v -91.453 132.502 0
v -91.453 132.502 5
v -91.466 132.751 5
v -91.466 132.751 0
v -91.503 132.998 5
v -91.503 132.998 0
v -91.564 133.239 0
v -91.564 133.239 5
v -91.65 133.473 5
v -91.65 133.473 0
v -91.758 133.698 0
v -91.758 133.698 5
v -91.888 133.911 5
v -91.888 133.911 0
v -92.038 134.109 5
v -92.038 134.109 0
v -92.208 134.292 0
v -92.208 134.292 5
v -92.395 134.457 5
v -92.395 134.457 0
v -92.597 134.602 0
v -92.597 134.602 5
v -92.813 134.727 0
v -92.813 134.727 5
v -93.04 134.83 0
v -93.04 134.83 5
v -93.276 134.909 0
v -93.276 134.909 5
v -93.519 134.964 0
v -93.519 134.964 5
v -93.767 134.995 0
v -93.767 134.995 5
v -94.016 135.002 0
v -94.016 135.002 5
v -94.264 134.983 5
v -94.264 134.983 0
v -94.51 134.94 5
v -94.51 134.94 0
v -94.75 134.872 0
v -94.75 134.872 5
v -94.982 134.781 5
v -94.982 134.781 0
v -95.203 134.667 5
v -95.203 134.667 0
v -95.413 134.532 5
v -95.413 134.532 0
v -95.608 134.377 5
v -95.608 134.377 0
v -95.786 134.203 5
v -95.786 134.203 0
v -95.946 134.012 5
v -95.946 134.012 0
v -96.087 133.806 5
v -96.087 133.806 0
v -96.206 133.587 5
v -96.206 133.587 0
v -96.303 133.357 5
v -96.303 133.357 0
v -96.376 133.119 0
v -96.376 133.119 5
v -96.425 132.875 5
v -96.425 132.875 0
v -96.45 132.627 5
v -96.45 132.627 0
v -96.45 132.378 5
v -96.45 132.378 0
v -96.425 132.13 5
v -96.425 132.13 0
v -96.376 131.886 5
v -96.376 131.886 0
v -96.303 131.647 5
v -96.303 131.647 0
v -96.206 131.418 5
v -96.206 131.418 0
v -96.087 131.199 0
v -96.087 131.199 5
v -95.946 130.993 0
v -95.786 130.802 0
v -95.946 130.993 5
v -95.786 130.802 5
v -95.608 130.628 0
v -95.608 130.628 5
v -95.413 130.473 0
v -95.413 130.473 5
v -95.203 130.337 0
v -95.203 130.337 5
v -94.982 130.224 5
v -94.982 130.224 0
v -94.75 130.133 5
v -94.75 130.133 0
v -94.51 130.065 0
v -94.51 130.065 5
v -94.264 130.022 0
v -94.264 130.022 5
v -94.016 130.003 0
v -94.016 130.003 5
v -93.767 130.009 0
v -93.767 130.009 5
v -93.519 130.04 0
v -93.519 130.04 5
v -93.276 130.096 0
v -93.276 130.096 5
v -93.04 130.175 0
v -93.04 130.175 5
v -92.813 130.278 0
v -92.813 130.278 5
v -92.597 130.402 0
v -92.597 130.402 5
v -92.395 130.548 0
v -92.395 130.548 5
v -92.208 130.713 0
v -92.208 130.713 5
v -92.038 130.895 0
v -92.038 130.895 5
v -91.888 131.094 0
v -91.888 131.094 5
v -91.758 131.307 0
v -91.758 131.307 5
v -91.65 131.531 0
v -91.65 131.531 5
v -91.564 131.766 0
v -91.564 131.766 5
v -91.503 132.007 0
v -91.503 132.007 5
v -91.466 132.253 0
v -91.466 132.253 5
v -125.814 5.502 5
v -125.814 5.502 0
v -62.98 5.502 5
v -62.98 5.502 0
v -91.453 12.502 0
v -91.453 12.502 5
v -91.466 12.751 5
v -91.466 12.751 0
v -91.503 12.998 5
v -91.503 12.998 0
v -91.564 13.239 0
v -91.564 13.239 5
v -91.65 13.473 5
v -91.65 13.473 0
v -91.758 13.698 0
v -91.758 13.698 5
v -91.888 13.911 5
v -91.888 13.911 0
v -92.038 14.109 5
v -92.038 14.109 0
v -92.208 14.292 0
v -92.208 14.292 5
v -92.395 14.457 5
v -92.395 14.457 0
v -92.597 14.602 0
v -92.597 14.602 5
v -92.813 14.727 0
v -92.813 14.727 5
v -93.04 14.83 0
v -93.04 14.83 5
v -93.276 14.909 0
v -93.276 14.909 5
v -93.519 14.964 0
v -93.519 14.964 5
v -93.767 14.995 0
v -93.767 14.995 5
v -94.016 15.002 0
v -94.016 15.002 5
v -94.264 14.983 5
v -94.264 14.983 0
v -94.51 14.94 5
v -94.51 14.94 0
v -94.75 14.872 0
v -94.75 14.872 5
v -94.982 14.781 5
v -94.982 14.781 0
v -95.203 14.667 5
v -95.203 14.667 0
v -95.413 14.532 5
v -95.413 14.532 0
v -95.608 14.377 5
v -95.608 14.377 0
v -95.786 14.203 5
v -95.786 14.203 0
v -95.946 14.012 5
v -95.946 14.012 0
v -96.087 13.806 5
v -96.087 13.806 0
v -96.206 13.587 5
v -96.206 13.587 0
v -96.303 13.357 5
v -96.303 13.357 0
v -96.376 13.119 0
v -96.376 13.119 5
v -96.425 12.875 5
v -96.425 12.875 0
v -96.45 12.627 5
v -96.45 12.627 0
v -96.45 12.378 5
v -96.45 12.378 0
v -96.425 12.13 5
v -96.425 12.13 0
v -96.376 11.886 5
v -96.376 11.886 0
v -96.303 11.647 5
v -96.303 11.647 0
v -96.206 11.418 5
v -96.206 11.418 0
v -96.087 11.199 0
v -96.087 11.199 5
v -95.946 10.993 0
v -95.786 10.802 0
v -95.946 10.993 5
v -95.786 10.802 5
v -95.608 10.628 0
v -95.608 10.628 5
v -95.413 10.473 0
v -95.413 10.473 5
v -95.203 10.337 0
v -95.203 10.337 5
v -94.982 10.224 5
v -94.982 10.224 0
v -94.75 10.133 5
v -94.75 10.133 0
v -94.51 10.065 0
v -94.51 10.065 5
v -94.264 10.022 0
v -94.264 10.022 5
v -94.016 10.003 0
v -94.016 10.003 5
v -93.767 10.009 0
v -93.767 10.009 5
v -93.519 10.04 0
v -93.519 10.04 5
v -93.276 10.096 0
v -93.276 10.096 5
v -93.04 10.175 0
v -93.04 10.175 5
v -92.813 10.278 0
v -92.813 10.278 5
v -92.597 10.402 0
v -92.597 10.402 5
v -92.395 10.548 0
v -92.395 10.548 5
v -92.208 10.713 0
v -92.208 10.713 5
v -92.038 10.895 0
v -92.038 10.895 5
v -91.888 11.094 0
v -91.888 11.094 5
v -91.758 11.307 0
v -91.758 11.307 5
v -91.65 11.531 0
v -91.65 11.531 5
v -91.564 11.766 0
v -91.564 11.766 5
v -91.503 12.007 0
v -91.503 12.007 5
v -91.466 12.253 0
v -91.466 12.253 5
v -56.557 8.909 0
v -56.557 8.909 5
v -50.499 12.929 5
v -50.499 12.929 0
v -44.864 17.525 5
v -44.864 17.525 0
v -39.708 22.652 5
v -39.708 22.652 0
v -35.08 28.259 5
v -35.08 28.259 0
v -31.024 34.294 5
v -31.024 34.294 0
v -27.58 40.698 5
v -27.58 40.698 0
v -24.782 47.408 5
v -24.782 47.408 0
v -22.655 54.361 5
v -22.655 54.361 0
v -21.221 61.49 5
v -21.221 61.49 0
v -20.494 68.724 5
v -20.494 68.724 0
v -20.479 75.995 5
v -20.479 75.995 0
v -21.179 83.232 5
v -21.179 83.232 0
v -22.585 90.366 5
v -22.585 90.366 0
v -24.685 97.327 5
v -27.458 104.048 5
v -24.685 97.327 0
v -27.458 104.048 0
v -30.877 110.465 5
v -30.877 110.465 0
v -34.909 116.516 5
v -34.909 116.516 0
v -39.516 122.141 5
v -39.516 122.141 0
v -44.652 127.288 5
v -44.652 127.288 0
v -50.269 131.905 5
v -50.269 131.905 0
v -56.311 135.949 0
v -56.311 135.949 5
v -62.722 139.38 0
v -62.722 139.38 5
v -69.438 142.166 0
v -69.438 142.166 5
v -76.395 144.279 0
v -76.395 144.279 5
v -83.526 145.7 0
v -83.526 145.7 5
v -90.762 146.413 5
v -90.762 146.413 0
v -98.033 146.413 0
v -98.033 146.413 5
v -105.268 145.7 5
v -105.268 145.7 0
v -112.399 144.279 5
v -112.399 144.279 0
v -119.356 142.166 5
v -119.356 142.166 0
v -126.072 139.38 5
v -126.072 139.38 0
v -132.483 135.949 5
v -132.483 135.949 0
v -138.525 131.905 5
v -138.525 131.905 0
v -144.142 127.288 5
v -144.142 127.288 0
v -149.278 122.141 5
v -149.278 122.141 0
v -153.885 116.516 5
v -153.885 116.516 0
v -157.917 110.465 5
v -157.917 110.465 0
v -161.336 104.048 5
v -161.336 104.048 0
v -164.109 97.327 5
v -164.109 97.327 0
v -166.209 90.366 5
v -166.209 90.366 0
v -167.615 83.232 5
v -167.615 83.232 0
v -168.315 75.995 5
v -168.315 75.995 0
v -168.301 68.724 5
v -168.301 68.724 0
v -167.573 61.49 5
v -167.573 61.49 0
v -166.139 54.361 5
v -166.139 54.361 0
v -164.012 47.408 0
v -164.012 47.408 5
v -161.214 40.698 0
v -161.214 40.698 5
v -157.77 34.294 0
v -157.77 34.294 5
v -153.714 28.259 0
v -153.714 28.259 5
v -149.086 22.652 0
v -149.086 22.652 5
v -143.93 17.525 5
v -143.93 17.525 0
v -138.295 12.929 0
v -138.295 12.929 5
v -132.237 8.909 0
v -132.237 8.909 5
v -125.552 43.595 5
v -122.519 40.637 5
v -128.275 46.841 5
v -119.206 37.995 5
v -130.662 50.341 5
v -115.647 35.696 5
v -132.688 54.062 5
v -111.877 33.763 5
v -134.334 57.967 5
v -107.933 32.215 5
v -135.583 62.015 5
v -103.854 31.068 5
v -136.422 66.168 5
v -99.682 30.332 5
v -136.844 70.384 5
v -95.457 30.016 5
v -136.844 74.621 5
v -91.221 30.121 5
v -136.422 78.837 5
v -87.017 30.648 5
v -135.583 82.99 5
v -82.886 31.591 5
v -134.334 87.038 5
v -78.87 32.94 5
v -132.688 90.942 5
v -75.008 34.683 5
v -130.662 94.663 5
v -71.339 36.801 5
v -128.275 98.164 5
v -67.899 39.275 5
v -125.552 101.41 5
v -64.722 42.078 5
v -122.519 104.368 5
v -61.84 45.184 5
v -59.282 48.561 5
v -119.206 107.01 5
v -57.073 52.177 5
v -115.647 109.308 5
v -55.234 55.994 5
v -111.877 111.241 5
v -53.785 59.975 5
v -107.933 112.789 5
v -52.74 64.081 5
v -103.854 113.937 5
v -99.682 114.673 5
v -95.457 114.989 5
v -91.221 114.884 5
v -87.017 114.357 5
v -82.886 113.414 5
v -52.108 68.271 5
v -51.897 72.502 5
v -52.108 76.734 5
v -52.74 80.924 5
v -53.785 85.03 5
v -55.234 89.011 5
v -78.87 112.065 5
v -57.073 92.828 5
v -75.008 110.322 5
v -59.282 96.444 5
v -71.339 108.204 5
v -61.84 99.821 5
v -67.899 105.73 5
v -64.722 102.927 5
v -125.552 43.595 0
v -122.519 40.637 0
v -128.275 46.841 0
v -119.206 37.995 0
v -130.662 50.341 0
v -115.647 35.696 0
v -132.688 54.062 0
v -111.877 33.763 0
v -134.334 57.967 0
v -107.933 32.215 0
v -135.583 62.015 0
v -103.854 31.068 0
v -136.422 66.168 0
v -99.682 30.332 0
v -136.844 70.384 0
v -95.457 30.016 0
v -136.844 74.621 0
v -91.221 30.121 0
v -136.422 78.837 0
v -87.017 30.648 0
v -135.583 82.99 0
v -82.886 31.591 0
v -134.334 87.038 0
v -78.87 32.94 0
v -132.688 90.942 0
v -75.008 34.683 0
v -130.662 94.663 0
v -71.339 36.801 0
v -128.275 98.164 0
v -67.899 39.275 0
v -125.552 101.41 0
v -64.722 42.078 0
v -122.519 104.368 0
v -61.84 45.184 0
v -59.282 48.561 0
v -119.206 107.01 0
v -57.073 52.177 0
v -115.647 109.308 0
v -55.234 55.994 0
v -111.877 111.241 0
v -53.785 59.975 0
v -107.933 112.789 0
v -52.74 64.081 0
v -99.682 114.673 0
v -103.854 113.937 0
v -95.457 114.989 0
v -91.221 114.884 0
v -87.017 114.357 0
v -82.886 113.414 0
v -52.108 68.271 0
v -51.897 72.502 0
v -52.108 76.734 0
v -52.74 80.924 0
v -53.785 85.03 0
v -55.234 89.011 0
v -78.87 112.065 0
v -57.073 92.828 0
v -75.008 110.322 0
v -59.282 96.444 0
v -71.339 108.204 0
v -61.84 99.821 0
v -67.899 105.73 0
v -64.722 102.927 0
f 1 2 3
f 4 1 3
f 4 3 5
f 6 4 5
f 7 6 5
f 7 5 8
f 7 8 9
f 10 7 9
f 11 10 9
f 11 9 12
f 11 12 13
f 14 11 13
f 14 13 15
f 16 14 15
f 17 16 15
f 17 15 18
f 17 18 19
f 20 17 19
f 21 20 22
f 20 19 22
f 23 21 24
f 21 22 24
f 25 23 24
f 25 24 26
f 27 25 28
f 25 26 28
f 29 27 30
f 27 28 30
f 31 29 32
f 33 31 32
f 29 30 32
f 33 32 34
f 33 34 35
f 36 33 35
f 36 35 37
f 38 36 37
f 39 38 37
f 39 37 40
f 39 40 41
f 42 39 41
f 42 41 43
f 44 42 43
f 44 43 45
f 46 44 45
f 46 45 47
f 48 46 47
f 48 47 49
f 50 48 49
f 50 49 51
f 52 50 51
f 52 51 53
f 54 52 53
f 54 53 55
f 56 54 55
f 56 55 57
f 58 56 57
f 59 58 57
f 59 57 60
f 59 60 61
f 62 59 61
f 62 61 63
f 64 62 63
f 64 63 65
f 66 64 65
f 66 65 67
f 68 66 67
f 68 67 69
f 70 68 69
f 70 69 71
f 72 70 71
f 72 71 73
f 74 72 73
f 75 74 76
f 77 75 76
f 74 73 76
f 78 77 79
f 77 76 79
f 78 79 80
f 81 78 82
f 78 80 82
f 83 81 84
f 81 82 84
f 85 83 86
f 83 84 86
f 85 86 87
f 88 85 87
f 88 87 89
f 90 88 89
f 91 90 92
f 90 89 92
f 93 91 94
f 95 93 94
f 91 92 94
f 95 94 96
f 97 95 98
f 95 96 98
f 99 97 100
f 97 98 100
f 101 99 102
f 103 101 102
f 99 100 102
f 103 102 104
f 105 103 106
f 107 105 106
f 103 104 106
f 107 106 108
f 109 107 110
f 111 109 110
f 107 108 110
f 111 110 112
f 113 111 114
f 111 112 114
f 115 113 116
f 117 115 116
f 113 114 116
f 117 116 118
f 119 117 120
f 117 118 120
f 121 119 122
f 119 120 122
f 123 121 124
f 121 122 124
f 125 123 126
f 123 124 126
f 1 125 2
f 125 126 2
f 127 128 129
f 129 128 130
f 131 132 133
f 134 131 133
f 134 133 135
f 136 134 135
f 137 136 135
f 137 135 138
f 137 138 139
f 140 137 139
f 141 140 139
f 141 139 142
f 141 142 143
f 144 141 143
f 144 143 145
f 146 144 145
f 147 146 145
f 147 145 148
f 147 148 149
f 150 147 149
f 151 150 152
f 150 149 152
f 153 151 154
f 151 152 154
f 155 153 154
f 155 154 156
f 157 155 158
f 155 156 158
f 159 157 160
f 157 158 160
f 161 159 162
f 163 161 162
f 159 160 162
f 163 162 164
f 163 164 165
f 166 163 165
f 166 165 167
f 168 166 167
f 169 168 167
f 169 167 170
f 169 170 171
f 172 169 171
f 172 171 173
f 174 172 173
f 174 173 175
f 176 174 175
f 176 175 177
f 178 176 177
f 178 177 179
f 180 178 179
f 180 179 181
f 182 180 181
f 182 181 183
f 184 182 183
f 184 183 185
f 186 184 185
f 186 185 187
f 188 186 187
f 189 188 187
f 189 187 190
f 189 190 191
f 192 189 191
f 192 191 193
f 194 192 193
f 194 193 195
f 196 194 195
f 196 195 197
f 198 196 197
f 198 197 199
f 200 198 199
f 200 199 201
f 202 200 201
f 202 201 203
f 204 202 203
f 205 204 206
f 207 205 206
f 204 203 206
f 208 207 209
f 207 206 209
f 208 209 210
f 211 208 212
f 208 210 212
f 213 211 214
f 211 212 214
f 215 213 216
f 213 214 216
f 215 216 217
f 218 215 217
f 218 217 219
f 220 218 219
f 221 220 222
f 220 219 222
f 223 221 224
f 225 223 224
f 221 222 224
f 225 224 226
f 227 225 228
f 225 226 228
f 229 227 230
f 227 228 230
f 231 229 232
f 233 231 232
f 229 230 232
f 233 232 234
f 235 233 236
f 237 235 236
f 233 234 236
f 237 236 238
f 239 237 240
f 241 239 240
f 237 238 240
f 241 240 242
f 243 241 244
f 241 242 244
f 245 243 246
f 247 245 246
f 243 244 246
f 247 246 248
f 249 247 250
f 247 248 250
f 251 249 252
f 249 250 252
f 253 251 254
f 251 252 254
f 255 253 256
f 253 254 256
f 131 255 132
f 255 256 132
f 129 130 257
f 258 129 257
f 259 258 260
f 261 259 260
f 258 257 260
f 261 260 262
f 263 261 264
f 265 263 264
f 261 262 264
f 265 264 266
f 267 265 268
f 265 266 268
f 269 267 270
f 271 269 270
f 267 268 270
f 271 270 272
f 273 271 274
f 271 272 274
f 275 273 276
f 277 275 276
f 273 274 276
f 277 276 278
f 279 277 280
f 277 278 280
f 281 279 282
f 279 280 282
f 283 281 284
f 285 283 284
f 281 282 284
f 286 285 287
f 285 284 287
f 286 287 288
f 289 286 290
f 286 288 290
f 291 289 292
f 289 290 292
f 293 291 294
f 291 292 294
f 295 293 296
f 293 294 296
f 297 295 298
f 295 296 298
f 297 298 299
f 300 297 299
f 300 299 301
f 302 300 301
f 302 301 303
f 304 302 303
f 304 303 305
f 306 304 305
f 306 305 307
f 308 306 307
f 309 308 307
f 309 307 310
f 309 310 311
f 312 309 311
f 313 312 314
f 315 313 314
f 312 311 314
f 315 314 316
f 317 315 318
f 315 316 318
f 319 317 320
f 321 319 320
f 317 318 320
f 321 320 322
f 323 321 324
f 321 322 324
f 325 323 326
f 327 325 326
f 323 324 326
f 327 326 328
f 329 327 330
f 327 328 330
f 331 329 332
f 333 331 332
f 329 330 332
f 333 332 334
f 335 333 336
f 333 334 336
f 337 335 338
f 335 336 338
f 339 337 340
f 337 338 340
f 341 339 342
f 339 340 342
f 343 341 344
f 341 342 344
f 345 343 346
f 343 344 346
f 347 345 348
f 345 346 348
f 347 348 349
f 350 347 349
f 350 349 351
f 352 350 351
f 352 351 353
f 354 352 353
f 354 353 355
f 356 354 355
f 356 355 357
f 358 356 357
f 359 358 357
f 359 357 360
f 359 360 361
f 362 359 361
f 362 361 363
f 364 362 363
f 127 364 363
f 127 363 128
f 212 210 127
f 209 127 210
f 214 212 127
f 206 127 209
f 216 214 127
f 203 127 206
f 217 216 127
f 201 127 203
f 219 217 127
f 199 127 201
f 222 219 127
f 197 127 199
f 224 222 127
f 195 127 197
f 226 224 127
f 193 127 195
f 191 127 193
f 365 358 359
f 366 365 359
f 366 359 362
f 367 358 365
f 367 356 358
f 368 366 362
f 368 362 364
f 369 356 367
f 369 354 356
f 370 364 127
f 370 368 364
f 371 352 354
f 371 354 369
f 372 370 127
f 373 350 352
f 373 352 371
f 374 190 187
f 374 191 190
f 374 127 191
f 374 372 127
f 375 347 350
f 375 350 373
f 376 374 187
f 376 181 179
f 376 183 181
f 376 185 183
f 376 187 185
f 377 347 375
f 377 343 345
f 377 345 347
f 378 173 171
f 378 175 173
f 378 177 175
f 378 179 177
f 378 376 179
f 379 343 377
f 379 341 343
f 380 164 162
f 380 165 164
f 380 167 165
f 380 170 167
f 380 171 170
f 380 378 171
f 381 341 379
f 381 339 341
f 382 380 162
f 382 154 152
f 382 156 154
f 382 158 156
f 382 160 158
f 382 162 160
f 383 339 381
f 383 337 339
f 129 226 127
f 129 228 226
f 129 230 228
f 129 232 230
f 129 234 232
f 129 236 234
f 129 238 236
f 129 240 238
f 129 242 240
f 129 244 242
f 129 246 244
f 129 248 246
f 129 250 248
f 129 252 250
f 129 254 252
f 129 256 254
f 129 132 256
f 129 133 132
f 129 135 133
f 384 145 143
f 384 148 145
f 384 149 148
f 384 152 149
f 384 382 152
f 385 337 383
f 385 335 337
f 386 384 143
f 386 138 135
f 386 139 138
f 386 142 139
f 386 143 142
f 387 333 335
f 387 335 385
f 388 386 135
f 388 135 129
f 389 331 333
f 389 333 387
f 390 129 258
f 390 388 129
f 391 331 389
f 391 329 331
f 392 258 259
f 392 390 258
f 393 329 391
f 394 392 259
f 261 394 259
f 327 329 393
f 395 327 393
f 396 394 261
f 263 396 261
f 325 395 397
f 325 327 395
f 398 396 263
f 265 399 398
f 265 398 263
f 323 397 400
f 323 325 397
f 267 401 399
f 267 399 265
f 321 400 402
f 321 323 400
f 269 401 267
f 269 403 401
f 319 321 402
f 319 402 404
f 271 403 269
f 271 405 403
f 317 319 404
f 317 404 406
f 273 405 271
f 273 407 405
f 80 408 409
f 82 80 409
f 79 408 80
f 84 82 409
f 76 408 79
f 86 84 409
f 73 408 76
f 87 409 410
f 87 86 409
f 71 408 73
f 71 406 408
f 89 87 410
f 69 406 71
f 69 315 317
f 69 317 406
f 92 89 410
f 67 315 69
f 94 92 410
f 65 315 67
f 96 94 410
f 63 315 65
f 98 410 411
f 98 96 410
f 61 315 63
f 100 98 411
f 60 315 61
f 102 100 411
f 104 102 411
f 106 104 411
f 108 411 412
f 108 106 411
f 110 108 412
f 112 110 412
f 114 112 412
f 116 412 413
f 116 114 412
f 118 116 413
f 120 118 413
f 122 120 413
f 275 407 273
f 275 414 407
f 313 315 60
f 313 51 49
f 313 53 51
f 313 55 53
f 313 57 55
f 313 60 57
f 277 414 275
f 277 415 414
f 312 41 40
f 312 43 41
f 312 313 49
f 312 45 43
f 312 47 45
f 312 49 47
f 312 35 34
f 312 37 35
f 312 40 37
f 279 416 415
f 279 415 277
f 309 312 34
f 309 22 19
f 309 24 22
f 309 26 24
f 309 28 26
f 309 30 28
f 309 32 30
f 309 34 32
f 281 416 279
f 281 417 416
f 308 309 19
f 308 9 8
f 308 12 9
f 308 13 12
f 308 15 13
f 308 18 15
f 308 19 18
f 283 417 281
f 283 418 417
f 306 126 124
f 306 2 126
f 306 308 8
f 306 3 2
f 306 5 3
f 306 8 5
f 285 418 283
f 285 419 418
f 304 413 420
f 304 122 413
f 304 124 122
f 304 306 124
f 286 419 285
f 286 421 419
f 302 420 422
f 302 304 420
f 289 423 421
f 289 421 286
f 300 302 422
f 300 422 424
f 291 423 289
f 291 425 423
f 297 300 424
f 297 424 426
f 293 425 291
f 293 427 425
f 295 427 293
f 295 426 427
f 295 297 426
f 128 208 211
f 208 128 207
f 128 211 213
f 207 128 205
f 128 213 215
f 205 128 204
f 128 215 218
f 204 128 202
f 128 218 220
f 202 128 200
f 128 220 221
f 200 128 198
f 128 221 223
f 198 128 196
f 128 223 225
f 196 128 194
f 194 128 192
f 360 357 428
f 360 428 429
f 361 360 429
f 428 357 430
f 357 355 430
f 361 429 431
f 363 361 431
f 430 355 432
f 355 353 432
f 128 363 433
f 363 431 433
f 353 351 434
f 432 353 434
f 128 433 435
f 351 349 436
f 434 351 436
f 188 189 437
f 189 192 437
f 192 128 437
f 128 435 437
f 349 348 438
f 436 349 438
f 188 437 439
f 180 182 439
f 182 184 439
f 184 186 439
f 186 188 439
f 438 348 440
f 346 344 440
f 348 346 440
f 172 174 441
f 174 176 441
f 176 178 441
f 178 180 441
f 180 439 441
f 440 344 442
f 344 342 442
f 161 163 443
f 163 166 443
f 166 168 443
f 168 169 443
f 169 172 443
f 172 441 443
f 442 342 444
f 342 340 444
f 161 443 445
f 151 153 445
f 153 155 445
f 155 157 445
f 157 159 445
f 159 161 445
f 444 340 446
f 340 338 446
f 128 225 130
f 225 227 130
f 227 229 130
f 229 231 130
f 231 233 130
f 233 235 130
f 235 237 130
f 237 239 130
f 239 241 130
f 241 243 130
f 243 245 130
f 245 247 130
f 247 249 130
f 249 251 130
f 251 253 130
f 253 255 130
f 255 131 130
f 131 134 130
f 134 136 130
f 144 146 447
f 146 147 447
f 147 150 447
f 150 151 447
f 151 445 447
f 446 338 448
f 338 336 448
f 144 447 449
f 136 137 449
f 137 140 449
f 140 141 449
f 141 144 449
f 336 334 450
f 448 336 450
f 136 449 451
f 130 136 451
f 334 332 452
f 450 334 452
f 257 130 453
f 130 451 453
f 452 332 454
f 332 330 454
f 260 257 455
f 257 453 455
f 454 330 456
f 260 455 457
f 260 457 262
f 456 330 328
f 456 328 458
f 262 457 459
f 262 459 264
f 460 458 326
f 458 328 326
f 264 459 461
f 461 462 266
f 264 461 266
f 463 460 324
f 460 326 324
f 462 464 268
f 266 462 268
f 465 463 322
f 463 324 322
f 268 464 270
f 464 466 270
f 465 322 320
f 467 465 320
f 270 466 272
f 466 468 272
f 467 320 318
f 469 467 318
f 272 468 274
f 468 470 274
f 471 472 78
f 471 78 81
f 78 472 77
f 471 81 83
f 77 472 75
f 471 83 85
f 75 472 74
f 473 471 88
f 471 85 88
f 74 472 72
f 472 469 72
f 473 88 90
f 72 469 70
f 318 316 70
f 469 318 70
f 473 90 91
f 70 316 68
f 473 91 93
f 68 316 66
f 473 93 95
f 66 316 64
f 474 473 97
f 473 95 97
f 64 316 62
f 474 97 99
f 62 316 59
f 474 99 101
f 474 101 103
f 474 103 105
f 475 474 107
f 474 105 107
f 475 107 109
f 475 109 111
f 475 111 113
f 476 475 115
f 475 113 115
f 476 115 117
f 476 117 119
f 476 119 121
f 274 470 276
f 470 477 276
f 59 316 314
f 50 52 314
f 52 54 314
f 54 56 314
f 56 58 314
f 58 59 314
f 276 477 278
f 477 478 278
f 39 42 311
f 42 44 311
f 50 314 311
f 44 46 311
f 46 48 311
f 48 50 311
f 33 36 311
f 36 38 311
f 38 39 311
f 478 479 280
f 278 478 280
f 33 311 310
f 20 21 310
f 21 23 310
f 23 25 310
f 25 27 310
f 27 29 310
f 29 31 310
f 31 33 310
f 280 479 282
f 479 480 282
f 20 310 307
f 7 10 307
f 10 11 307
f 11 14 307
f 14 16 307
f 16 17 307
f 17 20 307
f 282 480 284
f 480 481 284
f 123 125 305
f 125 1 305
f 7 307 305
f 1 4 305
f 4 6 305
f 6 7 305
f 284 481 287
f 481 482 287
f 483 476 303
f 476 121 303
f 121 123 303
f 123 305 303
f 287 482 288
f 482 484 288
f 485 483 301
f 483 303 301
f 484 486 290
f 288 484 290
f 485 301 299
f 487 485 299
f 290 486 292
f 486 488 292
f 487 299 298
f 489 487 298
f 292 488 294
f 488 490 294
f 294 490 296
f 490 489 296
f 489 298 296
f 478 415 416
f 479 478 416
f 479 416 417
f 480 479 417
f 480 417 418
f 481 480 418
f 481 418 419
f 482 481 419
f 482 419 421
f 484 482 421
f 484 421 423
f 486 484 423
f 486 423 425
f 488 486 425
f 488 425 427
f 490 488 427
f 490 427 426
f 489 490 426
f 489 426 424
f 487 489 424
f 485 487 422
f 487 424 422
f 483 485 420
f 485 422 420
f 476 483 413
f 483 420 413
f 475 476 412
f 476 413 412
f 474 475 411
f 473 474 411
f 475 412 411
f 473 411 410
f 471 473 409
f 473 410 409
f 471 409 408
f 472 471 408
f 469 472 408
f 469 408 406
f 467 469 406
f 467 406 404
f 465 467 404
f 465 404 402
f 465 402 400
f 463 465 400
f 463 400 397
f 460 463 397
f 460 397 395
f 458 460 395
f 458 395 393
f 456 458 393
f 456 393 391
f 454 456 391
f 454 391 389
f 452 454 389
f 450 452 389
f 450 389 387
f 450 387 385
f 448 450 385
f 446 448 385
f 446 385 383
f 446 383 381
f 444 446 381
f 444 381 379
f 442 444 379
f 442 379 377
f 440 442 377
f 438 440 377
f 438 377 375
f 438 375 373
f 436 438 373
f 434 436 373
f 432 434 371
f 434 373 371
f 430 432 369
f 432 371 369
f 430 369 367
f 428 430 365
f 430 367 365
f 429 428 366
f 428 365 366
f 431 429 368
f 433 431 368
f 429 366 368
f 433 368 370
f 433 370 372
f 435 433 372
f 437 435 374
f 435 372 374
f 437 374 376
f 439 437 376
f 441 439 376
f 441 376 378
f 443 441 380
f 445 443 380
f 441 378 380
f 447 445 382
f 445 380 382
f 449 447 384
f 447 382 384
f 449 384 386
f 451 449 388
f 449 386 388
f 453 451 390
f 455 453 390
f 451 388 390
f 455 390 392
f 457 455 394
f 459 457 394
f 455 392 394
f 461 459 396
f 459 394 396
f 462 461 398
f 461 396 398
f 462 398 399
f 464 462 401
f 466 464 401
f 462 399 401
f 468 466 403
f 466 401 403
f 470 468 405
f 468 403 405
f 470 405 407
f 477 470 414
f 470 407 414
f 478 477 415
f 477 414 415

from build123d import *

# Parameters (mm, degrees)
BOSS_EXTRUDE1_DEPTH = 5
SKETCH2_R           = 2.5
CUT_EXTRUDE1_DEPTH  = 10
CUT_EXTRUDE2_REACH  = 225.261
SKETCH3_R           = 42.5


with BuildPart() as part:
    # Sketch1 → Boss-Extrude1 (new body)
    with BuildSketch(Plane.XY):
        with BuildLine():
            Line((-125.81358794, 5.502409601), (-62.980475651, 5.502409601))
            ThreePointArc((-62.980475651, 5.502409601), (-94.397031795, 146.502409601), (-125.81358794, 5.502409601))
        make_face()
    extrude(amount=BOSS_EXTRUDE1_DEPTH)

    # Sketch2 → Cut-Extrude1 (cut)
    with BuildSketch(Plane.XY.offset(5)):
        with Locations((-93.953395264, 132.502409601)):
            Circle(SKETCH2_R)
        with Locations((-93.953395264, 12.502409601)):
            Circle(SKETCH2_R)
    extrude(amount=-CUT_EXTRUDE1_DEPTH, mode=Mode.SUBTRACT)

    # Sketch3 → Cut-Extrude2 (cut, up to next)
    with BuildSketch(Plane.XY.offset(5), mode=Mode.PRIVATE) as cut_extrude2_sk1:
        with Locations((-94.397031795, 72.502409601)):
            Circle(SKETCH3_R)
    cut_extrude2_tool1 = extrude(cut_extrude2_sk1.sketch, amount=-CUT_EXTRUDE2_REACH, mode=Mode.PRIVATE) & part.part
    add(cut_extrude2_tool1.solids().sort_by_distance((-94.397032, 72.50241, 5))[0], mode=Mode.SUBTRACT)


solid = part.part
